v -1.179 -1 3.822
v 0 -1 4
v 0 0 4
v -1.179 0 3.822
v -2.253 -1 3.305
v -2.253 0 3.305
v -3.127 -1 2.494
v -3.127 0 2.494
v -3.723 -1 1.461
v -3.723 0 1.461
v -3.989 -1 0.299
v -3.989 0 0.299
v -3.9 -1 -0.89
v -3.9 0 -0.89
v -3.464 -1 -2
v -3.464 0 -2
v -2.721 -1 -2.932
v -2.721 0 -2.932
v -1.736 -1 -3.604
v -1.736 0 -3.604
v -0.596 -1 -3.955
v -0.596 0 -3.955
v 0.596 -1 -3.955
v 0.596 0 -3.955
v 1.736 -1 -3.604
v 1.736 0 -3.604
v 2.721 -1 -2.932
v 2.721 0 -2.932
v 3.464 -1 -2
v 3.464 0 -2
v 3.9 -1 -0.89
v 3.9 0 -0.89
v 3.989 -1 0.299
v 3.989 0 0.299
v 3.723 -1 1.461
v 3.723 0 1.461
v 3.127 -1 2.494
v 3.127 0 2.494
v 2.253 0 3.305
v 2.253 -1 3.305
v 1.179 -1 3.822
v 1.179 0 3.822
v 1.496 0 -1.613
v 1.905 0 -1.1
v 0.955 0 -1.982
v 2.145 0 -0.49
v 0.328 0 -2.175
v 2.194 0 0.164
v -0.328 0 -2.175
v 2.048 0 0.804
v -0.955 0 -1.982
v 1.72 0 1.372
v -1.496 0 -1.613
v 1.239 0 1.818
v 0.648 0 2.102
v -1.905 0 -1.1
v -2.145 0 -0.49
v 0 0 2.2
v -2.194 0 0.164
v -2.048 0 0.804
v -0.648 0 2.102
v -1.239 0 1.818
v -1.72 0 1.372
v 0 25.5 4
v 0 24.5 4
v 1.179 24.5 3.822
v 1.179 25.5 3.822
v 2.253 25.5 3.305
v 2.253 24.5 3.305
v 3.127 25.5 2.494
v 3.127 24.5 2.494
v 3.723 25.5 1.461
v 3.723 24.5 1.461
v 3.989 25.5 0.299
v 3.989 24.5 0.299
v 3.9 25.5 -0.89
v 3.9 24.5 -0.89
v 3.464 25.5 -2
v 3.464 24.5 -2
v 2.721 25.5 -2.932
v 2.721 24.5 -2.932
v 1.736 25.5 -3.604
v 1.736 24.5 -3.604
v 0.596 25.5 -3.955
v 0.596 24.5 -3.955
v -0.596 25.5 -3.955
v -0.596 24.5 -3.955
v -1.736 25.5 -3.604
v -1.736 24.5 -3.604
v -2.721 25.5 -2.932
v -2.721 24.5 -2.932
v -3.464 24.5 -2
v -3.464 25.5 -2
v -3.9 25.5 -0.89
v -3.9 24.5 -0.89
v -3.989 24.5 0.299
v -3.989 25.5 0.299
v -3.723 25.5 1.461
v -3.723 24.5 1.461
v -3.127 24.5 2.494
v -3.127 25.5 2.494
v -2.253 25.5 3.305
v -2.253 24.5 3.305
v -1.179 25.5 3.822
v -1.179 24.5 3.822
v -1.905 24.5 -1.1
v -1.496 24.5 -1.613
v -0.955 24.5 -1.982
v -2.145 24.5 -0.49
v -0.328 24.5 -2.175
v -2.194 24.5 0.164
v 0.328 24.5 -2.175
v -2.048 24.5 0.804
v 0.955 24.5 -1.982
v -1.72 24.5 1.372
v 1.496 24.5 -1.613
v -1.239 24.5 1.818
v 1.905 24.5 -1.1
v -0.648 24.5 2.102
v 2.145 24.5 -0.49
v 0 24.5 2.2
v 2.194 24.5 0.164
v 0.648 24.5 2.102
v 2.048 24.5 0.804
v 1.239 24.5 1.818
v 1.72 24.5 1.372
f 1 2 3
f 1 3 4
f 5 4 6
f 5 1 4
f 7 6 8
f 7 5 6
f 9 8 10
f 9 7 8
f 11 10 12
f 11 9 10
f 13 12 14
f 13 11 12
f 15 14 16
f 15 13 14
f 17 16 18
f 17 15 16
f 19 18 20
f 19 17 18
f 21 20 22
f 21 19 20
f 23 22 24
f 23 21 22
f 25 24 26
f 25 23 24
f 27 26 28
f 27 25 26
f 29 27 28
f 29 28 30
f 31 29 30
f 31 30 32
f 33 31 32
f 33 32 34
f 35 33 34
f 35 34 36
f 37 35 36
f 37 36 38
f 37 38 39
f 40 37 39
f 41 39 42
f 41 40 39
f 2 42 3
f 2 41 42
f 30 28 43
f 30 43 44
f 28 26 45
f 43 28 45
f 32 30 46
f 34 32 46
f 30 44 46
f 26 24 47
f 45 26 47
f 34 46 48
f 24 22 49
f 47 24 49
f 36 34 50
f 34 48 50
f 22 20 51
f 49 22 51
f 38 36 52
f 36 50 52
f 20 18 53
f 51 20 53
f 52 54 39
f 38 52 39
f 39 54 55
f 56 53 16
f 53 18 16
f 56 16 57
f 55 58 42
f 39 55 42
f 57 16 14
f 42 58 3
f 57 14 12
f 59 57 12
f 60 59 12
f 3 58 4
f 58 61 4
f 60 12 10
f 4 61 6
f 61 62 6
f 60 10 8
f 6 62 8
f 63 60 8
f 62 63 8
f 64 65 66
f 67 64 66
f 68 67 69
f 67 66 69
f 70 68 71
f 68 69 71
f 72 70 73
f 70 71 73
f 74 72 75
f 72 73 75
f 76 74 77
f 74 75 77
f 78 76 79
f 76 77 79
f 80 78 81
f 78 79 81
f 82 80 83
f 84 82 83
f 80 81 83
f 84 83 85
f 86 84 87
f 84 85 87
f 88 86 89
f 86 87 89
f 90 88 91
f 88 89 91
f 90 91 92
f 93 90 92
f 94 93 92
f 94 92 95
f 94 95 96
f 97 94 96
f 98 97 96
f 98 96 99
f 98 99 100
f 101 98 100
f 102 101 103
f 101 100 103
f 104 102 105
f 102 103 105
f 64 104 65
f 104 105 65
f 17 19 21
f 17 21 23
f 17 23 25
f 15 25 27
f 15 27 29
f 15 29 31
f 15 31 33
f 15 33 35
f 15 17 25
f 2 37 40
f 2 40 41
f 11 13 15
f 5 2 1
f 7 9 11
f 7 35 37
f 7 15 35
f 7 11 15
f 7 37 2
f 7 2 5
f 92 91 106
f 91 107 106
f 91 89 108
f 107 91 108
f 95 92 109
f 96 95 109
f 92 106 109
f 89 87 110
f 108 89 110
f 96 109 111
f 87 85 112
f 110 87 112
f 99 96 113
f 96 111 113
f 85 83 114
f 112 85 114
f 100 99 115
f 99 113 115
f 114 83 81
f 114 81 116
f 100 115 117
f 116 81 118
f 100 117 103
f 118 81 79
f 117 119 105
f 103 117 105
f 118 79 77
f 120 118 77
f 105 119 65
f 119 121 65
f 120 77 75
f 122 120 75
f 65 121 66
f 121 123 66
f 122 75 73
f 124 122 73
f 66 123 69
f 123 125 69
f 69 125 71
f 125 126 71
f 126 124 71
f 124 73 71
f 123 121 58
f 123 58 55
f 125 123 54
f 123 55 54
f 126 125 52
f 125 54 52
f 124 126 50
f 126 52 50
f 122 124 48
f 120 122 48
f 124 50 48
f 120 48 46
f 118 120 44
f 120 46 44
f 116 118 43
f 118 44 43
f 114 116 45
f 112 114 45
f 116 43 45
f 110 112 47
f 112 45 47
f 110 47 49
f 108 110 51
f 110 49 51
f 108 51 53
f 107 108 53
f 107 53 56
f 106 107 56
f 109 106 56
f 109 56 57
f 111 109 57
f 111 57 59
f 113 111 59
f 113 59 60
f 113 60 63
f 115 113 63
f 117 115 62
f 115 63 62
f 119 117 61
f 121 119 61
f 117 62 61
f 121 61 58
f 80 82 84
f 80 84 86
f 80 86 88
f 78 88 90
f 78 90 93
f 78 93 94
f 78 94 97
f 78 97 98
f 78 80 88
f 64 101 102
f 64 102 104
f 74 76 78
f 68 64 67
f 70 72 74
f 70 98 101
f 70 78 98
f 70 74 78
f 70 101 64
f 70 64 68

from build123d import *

# Parameters (mm, degrees)
SKETCH1_R           = 2.2
BOSS_EXTRUDE1_DEPTH = 24.5
SKETCH2_R           = 4
BOSS_EXTRUDE2_DEPTH = 1
BOSS_EXTRUDE3_START = 1
SKETCH3_R           = 4
BOSS_EXTRUDE3_DEPTH = 1


with BuildPart() as part:
    # Sketch1 → Boss-Extrude1 (new body)
    with BuildSketch(Plane(origin=(0, 0, 0), x_dir=(1, 0, 0), z_dir=(0, 1, 0))):
        with Locations(Location((0, 0, 0), (0, 0, 270))):
            Circle(SKETCH1_R)
    extrude(amount=BOSS_EXTRUDE1_DEPTH)

    # Sketch2 → Boss-Extrude2 (add)
    with BuildSketch(Plane(origin=(0, 24.5, 0), x_dir=(1, 0, 0), z_dir=(0, 1, 0))):
        with Locations(Location((0, 0, 0), (0, 0, 270))):
            Circle(SKETCH2_R)
    extrude(amount=BOSS_EXTRUDE2_DEPTH)

    # Sketch3 → Boss-Extrude3 (add)
    with BuildSketch(Plane.XZ.offset(BOSS_EXTRUDE3_START)):
        with Locations(Location((0, 0, 0), (0, 0, 90))):
            Circle(SKETCH3_R)
    extrude(amount=-BOSS_EXTRUDE3_DEPTH)


solid = part.part
